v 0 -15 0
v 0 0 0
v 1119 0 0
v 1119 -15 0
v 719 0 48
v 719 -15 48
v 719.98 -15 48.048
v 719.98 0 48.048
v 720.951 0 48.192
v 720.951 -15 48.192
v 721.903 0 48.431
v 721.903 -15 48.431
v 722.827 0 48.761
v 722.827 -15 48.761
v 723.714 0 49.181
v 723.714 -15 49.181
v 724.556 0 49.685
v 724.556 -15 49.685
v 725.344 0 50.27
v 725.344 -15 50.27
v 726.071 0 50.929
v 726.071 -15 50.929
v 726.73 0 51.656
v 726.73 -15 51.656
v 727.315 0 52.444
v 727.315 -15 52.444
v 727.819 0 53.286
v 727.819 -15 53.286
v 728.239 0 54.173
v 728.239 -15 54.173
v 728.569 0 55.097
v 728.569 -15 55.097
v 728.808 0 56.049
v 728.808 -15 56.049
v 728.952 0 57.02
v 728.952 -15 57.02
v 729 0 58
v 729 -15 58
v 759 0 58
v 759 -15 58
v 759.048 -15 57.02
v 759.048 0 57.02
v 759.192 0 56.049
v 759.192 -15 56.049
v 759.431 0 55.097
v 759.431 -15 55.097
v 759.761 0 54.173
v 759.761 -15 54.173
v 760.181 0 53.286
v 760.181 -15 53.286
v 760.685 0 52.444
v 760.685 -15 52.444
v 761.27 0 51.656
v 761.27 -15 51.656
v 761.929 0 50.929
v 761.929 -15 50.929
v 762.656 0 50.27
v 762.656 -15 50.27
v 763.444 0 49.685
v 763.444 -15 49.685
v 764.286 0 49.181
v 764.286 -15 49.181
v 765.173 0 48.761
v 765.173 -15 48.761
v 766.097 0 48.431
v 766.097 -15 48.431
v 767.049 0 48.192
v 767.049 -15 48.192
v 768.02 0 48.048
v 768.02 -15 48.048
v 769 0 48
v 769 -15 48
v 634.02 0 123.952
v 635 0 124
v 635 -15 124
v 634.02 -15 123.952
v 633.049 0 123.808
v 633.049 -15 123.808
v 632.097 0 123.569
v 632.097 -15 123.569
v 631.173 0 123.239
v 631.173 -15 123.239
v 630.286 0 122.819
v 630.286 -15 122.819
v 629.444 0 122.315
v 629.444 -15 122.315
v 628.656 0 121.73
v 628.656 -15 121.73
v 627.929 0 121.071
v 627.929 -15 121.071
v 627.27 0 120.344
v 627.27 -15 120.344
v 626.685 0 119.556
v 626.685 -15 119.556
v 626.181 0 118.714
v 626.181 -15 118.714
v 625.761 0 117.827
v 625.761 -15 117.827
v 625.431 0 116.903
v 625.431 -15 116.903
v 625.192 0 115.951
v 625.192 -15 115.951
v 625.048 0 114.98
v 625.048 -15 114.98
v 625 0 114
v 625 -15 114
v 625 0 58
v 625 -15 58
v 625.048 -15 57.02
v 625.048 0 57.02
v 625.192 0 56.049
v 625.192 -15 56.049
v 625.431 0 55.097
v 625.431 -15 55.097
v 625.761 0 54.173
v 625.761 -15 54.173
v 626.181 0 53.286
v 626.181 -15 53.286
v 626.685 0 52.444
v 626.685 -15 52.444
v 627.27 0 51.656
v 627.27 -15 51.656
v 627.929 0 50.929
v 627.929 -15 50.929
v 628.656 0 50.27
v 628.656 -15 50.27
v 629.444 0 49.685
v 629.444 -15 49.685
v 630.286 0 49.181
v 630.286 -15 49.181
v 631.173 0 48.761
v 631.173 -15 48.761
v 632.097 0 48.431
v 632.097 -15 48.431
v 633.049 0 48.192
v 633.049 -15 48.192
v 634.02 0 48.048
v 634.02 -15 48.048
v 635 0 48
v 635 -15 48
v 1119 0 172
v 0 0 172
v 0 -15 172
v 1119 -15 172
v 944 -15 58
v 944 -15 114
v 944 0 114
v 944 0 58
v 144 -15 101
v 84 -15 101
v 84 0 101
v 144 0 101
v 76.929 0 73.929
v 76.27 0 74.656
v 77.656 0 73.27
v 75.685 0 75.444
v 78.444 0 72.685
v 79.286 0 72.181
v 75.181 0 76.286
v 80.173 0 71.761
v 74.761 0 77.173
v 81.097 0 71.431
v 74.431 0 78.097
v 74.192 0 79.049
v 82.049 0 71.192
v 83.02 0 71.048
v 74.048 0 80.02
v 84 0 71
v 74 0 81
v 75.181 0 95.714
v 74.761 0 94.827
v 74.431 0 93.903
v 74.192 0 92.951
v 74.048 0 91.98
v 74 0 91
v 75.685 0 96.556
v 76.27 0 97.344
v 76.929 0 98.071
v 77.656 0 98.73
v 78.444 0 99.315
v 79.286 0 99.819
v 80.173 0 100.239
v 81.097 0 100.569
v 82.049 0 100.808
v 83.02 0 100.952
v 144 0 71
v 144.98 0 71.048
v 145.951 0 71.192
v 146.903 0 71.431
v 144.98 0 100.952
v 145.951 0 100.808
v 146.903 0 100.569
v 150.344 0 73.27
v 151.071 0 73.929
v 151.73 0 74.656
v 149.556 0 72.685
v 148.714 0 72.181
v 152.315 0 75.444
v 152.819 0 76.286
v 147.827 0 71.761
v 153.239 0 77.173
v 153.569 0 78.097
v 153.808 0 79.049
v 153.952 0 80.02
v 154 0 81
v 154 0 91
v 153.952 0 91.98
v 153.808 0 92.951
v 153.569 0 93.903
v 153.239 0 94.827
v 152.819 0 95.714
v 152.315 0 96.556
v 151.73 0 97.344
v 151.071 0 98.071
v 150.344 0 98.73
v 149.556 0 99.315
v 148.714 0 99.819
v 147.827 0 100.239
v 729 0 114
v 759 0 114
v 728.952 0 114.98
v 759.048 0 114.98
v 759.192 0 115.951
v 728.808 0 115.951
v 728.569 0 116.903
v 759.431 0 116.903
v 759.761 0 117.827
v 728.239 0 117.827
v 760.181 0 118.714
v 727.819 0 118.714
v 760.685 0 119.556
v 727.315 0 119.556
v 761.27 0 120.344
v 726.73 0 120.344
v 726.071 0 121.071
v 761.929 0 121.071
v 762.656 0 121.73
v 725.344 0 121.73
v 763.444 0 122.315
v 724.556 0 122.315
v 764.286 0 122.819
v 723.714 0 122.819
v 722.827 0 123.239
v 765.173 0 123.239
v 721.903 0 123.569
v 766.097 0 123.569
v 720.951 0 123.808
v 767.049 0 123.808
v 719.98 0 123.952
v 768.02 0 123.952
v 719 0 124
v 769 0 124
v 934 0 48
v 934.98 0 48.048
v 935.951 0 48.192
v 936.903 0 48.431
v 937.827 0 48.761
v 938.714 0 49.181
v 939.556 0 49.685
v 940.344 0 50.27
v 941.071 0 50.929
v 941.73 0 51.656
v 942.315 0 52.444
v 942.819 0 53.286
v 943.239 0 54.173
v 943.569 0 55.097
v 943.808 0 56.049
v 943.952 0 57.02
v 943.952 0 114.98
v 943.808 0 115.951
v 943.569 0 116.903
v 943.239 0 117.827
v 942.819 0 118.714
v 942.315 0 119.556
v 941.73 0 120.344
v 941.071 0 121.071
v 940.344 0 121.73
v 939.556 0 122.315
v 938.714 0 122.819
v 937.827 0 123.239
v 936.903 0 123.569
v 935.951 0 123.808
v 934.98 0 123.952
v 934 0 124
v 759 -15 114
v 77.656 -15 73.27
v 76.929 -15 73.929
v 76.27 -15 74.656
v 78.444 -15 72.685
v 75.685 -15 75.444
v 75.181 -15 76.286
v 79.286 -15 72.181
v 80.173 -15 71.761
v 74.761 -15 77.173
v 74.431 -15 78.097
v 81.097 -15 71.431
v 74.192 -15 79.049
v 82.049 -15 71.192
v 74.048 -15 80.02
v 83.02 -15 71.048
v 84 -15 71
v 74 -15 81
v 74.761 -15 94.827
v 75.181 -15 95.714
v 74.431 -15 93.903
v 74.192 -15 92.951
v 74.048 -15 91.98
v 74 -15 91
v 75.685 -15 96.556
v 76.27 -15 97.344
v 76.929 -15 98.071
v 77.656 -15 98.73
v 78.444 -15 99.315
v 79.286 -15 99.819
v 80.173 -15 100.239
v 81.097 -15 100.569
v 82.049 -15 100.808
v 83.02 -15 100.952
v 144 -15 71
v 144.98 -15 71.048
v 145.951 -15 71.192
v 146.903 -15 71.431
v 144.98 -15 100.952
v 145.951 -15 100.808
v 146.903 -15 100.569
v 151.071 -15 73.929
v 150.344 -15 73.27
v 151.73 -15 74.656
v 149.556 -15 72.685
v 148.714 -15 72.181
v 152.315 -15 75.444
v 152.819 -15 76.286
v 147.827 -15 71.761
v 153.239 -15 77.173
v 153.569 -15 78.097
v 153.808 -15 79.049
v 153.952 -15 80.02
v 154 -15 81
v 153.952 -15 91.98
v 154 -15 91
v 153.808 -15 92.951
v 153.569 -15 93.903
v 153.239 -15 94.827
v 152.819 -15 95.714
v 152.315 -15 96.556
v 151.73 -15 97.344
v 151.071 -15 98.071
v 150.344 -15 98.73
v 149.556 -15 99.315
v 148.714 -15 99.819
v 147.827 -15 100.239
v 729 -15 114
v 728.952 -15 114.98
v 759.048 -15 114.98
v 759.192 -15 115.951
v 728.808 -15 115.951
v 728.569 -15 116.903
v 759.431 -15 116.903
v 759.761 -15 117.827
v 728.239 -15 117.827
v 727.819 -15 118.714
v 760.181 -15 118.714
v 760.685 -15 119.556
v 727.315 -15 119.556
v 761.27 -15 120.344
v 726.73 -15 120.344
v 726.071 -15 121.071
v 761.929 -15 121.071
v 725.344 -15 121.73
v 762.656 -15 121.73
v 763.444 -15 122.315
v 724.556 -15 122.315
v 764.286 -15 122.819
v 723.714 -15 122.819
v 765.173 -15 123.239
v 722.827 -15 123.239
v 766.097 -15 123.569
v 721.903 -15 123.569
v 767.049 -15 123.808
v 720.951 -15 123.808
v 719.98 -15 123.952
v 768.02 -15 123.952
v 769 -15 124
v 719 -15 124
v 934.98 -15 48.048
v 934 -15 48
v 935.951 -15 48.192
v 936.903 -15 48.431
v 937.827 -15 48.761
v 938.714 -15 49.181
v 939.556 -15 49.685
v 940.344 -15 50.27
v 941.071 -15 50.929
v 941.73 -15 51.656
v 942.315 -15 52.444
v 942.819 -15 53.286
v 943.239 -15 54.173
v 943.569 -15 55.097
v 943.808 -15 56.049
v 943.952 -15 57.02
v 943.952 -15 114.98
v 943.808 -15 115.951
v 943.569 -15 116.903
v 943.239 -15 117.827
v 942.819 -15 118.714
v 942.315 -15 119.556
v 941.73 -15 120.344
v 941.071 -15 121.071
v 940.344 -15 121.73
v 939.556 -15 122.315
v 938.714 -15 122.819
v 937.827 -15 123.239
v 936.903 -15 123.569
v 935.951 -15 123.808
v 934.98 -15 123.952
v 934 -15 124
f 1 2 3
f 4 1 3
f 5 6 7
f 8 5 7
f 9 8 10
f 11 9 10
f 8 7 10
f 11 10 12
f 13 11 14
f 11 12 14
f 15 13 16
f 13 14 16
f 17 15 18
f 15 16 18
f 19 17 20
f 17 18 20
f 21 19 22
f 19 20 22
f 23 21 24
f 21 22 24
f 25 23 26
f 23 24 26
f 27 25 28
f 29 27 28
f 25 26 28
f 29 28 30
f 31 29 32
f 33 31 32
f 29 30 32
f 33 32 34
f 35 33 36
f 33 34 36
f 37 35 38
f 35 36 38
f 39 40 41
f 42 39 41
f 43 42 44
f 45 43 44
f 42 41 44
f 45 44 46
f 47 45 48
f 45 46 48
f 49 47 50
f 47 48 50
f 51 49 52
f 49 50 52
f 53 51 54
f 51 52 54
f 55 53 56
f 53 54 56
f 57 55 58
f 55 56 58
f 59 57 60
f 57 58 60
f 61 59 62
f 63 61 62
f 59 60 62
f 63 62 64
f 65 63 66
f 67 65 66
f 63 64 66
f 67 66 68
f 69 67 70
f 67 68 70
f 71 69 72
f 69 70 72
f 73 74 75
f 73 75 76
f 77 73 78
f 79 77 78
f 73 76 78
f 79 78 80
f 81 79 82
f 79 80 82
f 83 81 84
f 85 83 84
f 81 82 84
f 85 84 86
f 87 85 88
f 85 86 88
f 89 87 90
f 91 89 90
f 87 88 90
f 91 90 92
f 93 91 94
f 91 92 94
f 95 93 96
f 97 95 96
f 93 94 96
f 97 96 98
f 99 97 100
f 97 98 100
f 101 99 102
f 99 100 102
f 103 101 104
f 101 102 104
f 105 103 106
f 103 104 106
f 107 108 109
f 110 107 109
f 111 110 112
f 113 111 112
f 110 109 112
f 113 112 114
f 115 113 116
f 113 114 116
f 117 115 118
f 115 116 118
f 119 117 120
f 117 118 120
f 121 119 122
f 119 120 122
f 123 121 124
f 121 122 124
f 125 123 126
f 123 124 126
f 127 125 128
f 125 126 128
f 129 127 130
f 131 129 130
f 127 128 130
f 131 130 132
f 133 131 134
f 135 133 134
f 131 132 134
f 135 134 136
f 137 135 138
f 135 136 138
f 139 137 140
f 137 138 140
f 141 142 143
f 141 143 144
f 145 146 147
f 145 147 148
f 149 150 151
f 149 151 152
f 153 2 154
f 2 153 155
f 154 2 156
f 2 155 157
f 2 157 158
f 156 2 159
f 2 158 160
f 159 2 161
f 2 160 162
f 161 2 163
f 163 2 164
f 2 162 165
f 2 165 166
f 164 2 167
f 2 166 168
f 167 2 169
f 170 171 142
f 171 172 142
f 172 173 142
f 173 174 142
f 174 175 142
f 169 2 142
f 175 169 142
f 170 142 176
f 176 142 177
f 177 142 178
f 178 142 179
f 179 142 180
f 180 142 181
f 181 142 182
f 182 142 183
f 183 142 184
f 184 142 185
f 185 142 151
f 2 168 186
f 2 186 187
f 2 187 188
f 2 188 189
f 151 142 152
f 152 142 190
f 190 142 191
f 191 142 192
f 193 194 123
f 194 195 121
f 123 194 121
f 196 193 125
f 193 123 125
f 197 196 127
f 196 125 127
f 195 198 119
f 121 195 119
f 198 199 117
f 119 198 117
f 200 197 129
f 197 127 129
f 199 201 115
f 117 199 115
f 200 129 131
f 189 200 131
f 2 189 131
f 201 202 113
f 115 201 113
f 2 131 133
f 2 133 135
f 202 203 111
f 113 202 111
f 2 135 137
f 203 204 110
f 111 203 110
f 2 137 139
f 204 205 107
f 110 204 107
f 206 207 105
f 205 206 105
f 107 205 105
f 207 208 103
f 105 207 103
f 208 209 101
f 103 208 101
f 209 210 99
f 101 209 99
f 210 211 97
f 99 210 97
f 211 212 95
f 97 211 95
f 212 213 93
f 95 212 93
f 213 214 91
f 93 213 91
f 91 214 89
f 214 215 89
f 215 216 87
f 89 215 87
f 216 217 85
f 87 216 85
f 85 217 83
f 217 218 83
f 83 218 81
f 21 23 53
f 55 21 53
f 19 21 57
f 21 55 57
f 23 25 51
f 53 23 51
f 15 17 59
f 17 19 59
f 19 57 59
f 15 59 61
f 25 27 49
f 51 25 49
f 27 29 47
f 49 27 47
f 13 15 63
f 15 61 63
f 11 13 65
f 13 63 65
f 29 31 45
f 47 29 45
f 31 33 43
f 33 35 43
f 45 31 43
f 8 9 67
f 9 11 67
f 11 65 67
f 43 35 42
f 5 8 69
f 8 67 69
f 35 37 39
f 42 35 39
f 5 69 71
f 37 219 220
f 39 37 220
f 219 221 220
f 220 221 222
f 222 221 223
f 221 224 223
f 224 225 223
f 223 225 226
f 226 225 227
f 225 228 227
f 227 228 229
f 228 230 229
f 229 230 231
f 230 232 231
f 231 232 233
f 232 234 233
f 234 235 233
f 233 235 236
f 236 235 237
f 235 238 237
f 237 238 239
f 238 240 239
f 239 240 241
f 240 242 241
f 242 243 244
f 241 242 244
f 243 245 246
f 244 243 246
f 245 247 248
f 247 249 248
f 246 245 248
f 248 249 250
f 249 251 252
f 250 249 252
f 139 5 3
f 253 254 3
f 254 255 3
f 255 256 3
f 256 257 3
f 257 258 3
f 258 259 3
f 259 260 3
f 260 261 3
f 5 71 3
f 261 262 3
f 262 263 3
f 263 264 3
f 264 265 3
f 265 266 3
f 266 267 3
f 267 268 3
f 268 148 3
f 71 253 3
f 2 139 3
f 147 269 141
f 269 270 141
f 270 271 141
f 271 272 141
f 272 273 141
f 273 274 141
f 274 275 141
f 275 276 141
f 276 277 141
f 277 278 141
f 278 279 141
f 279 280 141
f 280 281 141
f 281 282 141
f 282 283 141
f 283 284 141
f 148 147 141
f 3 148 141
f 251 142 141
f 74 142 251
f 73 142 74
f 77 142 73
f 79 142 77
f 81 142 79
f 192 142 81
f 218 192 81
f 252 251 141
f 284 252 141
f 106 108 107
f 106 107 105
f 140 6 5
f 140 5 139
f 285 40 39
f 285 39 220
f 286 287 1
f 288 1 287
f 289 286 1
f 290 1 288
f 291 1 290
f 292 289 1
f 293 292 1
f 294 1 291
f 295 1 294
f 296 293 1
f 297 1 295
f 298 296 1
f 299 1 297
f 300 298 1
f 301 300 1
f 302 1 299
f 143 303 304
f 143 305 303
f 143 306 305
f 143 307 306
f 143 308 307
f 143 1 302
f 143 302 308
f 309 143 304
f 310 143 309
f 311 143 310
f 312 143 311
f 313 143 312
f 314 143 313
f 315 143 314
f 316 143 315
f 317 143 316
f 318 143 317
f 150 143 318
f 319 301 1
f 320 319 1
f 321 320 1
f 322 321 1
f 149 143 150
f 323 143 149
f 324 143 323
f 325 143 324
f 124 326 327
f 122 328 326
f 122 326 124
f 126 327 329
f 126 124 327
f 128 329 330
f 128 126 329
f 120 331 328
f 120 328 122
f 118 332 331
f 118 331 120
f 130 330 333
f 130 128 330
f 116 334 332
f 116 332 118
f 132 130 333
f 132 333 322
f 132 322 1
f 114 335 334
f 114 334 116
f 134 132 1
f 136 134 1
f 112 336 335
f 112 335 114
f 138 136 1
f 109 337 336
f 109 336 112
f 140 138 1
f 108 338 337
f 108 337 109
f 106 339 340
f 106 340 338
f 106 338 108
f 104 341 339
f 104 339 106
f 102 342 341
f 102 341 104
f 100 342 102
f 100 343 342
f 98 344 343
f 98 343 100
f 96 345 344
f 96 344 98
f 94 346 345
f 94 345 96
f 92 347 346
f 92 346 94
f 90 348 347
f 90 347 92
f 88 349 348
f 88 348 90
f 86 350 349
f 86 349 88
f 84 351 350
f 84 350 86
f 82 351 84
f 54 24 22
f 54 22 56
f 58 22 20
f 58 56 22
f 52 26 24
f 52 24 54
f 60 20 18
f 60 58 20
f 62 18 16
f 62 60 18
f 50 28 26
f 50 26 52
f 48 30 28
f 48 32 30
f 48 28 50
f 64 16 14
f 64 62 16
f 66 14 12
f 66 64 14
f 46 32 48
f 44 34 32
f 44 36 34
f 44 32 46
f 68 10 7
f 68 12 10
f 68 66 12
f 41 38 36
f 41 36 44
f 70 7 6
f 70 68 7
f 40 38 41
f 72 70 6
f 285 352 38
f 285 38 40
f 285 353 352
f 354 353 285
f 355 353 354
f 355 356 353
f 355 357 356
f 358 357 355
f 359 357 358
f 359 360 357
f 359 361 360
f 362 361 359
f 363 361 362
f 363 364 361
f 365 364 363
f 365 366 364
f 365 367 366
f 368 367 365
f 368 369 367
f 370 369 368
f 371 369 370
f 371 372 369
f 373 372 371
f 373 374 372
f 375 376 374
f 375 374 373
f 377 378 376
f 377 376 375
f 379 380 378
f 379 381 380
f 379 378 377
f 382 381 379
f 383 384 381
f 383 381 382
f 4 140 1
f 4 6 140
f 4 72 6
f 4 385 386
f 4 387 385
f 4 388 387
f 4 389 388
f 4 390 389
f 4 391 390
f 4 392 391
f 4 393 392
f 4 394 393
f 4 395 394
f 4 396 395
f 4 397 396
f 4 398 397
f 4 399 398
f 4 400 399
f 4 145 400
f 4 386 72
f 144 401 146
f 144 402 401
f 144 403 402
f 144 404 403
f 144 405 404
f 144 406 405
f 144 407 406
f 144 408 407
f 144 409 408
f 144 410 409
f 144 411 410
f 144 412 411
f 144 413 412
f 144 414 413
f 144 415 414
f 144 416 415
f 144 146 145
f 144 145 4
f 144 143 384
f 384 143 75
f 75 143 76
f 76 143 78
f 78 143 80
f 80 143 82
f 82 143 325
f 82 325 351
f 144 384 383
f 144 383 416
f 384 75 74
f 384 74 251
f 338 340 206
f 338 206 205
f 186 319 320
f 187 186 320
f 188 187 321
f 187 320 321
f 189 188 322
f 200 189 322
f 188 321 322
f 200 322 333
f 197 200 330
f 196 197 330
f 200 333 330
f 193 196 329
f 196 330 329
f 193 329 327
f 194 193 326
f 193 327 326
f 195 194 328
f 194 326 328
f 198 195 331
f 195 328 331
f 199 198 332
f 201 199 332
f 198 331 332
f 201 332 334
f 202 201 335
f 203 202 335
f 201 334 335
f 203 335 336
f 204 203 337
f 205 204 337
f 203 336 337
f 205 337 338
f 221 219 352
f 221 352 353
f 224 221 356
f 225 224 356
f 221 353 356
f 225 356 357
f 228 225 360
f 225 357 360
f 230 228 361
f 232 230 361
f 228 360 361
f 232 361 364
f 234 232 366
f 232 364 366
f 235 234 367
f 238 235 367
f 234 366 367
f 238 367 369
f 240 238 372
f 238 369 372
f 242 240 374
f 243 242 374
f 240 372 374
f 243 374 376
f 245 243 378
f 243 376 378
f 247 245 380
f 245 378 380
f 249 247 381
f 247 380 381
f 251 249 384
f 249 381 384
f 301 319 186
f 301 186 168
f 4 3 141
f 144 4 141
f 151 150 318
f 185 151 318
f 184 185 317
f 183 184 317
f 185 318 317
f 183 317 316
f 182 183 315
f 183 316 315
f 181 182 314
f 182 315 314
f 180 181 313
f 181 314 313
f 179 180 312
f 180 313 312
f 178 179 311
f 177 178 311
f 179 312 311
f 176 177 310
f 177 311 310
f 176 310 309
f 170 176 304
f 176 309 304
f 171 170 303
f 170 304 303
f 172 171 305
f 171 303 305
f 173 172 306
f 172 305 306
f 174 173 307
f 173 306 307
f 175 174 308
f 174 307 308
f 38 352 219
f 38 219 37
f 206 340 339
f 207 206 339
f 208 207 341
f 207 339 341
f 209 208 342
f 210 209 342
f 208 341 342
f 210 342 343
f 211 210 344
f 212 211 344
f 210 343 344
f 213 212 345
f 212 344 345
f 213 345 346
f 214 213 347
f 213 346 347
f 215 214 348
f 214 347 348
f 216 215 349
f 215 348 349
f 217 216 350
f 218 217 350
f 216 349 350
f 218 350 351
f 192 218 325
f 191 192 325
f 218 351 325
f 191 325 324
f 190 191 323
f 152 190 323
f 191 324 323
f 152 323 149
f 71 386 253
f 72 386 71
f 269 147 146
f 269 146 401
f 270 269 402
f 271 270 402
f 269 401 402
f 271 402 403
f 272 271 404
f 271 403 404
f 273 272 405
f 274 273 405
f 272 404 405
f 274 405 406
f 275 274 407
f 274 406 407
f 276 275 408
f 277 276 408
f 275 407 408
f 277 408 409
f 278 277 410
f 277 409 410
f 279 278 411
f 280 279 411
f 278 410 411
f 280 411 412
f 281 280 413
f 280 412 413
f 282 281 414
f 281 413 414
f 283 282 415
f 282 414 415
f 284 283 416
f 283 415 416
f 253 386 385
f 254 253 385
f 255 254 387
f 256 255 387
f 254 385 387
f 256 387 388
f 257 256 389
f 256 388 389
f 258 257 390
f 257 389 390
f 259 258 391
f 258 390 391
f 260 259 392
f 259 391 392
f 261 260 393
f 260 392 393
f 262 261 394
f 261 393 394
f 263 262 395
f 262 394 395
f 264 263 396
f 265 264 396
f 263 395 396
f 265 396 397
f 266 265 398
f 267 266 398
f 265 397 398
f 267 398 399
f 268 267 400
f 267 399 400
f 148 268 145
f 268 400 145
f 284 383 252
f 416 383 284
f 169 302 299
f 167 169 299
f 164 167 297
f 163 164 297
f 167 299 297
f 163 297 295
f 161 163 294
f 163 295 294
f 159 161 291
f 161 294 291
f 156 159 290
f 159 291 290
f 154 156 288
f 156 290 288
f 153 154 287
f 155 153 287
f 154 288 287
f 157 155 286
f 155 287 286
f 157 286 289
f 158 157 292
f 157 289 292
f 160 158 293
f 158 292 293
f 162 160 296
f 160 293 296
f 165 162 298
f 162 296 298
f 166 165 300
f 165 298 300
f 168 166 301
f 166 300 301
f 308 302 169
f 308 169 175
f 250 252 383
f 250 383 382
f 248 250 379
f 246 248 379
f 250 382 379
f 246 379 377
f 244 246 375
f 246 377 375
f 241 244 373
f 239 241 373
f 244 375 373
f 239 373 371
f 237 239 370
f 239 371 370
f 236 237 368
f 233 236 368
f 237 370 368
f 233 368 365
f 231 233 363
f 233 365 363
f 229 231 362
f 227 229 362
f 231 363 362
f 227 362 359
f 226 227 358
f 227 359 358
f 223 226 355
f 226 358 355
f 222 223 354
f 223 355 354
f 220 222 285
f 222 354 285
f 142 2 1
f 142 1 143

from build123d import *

# Parameters (mm, degrees)
SKETCH_W     = 1119
SKETCH_H     = 172
PAD_DEPTH    = 15
POCKET_DEPTH = 15.001


with BuildPart() as part:
    # Sketch → Pad (new body)
    with BuildSketch(Plane.XZ):
        with Locations((559.5, 86)):
            Rectangle(SKETCH_W, SKETCH_H)
    extrude(amount=PAD_DEPTH)

    # Sketch001 (on Face6 of Pad) → Pocket (cut, through all)
    with BuildSketch(Plane.XZ.offset(15)):
        with BuildLine():
            ThreePointArc((635, 124), (627.928932, 121.071068), (625, 114))
            Line((625, 58), (625, 114))
            ThreePointArc((625, 58), (627.928932, 50.928932), (635, 48))
            Line((719, 48), (635, 48))
            ThreePointArc((719, 48), (726.071068, 50.928932), (729, 58))
            Line((729, 114), (729, 58))
            ThreePointArc((729, 114), (726.071068, 121.071068), (719, 124))
            Line((635, 124), (719, 124))
        make_face()
        with BuildLine():
            ThreePointArc((769, 124), (761.928932, 121.071068), (759, 114))
            Line((759, 58), (759, 114))
            ThreePointArc((759, 58), (761.928932, 50.928932), (769, 48))
            Line((934, 48), (769, 48))
            ThreePointArc((934, 48), (941.071068, 50.928932), (944, 58))
            Line((944, 114), (944, 58))
            ThreePointArc((944, 114), (941.071068, 121.071068), (934, 124))
            Line((769, 124), (934, 124))
        make_face()
        with BuildLine():
            ThreePointArc((84, 101), (76.928932, 98.071068), (74, 91))
            Line((74, 81), (74, 91))
            ThreePointArc((74, 81), (76.928932, 73.928932), (84, 71))
            Line((144, 71), (84, 71))
            ThreePointArc((144, 71), (151.071068, 73.928932), (154, 81))
            Line((154, 91), (154, 81))
            ThreePointArc((154, 91), (151.071068, 98.071068), (144, 101))
            Line((84, 101), (144, 101))
        make_face()
    extrude(amount=-POCKET_DEPTH, mode=Mode.SUBTRACT)


solid = part.part
